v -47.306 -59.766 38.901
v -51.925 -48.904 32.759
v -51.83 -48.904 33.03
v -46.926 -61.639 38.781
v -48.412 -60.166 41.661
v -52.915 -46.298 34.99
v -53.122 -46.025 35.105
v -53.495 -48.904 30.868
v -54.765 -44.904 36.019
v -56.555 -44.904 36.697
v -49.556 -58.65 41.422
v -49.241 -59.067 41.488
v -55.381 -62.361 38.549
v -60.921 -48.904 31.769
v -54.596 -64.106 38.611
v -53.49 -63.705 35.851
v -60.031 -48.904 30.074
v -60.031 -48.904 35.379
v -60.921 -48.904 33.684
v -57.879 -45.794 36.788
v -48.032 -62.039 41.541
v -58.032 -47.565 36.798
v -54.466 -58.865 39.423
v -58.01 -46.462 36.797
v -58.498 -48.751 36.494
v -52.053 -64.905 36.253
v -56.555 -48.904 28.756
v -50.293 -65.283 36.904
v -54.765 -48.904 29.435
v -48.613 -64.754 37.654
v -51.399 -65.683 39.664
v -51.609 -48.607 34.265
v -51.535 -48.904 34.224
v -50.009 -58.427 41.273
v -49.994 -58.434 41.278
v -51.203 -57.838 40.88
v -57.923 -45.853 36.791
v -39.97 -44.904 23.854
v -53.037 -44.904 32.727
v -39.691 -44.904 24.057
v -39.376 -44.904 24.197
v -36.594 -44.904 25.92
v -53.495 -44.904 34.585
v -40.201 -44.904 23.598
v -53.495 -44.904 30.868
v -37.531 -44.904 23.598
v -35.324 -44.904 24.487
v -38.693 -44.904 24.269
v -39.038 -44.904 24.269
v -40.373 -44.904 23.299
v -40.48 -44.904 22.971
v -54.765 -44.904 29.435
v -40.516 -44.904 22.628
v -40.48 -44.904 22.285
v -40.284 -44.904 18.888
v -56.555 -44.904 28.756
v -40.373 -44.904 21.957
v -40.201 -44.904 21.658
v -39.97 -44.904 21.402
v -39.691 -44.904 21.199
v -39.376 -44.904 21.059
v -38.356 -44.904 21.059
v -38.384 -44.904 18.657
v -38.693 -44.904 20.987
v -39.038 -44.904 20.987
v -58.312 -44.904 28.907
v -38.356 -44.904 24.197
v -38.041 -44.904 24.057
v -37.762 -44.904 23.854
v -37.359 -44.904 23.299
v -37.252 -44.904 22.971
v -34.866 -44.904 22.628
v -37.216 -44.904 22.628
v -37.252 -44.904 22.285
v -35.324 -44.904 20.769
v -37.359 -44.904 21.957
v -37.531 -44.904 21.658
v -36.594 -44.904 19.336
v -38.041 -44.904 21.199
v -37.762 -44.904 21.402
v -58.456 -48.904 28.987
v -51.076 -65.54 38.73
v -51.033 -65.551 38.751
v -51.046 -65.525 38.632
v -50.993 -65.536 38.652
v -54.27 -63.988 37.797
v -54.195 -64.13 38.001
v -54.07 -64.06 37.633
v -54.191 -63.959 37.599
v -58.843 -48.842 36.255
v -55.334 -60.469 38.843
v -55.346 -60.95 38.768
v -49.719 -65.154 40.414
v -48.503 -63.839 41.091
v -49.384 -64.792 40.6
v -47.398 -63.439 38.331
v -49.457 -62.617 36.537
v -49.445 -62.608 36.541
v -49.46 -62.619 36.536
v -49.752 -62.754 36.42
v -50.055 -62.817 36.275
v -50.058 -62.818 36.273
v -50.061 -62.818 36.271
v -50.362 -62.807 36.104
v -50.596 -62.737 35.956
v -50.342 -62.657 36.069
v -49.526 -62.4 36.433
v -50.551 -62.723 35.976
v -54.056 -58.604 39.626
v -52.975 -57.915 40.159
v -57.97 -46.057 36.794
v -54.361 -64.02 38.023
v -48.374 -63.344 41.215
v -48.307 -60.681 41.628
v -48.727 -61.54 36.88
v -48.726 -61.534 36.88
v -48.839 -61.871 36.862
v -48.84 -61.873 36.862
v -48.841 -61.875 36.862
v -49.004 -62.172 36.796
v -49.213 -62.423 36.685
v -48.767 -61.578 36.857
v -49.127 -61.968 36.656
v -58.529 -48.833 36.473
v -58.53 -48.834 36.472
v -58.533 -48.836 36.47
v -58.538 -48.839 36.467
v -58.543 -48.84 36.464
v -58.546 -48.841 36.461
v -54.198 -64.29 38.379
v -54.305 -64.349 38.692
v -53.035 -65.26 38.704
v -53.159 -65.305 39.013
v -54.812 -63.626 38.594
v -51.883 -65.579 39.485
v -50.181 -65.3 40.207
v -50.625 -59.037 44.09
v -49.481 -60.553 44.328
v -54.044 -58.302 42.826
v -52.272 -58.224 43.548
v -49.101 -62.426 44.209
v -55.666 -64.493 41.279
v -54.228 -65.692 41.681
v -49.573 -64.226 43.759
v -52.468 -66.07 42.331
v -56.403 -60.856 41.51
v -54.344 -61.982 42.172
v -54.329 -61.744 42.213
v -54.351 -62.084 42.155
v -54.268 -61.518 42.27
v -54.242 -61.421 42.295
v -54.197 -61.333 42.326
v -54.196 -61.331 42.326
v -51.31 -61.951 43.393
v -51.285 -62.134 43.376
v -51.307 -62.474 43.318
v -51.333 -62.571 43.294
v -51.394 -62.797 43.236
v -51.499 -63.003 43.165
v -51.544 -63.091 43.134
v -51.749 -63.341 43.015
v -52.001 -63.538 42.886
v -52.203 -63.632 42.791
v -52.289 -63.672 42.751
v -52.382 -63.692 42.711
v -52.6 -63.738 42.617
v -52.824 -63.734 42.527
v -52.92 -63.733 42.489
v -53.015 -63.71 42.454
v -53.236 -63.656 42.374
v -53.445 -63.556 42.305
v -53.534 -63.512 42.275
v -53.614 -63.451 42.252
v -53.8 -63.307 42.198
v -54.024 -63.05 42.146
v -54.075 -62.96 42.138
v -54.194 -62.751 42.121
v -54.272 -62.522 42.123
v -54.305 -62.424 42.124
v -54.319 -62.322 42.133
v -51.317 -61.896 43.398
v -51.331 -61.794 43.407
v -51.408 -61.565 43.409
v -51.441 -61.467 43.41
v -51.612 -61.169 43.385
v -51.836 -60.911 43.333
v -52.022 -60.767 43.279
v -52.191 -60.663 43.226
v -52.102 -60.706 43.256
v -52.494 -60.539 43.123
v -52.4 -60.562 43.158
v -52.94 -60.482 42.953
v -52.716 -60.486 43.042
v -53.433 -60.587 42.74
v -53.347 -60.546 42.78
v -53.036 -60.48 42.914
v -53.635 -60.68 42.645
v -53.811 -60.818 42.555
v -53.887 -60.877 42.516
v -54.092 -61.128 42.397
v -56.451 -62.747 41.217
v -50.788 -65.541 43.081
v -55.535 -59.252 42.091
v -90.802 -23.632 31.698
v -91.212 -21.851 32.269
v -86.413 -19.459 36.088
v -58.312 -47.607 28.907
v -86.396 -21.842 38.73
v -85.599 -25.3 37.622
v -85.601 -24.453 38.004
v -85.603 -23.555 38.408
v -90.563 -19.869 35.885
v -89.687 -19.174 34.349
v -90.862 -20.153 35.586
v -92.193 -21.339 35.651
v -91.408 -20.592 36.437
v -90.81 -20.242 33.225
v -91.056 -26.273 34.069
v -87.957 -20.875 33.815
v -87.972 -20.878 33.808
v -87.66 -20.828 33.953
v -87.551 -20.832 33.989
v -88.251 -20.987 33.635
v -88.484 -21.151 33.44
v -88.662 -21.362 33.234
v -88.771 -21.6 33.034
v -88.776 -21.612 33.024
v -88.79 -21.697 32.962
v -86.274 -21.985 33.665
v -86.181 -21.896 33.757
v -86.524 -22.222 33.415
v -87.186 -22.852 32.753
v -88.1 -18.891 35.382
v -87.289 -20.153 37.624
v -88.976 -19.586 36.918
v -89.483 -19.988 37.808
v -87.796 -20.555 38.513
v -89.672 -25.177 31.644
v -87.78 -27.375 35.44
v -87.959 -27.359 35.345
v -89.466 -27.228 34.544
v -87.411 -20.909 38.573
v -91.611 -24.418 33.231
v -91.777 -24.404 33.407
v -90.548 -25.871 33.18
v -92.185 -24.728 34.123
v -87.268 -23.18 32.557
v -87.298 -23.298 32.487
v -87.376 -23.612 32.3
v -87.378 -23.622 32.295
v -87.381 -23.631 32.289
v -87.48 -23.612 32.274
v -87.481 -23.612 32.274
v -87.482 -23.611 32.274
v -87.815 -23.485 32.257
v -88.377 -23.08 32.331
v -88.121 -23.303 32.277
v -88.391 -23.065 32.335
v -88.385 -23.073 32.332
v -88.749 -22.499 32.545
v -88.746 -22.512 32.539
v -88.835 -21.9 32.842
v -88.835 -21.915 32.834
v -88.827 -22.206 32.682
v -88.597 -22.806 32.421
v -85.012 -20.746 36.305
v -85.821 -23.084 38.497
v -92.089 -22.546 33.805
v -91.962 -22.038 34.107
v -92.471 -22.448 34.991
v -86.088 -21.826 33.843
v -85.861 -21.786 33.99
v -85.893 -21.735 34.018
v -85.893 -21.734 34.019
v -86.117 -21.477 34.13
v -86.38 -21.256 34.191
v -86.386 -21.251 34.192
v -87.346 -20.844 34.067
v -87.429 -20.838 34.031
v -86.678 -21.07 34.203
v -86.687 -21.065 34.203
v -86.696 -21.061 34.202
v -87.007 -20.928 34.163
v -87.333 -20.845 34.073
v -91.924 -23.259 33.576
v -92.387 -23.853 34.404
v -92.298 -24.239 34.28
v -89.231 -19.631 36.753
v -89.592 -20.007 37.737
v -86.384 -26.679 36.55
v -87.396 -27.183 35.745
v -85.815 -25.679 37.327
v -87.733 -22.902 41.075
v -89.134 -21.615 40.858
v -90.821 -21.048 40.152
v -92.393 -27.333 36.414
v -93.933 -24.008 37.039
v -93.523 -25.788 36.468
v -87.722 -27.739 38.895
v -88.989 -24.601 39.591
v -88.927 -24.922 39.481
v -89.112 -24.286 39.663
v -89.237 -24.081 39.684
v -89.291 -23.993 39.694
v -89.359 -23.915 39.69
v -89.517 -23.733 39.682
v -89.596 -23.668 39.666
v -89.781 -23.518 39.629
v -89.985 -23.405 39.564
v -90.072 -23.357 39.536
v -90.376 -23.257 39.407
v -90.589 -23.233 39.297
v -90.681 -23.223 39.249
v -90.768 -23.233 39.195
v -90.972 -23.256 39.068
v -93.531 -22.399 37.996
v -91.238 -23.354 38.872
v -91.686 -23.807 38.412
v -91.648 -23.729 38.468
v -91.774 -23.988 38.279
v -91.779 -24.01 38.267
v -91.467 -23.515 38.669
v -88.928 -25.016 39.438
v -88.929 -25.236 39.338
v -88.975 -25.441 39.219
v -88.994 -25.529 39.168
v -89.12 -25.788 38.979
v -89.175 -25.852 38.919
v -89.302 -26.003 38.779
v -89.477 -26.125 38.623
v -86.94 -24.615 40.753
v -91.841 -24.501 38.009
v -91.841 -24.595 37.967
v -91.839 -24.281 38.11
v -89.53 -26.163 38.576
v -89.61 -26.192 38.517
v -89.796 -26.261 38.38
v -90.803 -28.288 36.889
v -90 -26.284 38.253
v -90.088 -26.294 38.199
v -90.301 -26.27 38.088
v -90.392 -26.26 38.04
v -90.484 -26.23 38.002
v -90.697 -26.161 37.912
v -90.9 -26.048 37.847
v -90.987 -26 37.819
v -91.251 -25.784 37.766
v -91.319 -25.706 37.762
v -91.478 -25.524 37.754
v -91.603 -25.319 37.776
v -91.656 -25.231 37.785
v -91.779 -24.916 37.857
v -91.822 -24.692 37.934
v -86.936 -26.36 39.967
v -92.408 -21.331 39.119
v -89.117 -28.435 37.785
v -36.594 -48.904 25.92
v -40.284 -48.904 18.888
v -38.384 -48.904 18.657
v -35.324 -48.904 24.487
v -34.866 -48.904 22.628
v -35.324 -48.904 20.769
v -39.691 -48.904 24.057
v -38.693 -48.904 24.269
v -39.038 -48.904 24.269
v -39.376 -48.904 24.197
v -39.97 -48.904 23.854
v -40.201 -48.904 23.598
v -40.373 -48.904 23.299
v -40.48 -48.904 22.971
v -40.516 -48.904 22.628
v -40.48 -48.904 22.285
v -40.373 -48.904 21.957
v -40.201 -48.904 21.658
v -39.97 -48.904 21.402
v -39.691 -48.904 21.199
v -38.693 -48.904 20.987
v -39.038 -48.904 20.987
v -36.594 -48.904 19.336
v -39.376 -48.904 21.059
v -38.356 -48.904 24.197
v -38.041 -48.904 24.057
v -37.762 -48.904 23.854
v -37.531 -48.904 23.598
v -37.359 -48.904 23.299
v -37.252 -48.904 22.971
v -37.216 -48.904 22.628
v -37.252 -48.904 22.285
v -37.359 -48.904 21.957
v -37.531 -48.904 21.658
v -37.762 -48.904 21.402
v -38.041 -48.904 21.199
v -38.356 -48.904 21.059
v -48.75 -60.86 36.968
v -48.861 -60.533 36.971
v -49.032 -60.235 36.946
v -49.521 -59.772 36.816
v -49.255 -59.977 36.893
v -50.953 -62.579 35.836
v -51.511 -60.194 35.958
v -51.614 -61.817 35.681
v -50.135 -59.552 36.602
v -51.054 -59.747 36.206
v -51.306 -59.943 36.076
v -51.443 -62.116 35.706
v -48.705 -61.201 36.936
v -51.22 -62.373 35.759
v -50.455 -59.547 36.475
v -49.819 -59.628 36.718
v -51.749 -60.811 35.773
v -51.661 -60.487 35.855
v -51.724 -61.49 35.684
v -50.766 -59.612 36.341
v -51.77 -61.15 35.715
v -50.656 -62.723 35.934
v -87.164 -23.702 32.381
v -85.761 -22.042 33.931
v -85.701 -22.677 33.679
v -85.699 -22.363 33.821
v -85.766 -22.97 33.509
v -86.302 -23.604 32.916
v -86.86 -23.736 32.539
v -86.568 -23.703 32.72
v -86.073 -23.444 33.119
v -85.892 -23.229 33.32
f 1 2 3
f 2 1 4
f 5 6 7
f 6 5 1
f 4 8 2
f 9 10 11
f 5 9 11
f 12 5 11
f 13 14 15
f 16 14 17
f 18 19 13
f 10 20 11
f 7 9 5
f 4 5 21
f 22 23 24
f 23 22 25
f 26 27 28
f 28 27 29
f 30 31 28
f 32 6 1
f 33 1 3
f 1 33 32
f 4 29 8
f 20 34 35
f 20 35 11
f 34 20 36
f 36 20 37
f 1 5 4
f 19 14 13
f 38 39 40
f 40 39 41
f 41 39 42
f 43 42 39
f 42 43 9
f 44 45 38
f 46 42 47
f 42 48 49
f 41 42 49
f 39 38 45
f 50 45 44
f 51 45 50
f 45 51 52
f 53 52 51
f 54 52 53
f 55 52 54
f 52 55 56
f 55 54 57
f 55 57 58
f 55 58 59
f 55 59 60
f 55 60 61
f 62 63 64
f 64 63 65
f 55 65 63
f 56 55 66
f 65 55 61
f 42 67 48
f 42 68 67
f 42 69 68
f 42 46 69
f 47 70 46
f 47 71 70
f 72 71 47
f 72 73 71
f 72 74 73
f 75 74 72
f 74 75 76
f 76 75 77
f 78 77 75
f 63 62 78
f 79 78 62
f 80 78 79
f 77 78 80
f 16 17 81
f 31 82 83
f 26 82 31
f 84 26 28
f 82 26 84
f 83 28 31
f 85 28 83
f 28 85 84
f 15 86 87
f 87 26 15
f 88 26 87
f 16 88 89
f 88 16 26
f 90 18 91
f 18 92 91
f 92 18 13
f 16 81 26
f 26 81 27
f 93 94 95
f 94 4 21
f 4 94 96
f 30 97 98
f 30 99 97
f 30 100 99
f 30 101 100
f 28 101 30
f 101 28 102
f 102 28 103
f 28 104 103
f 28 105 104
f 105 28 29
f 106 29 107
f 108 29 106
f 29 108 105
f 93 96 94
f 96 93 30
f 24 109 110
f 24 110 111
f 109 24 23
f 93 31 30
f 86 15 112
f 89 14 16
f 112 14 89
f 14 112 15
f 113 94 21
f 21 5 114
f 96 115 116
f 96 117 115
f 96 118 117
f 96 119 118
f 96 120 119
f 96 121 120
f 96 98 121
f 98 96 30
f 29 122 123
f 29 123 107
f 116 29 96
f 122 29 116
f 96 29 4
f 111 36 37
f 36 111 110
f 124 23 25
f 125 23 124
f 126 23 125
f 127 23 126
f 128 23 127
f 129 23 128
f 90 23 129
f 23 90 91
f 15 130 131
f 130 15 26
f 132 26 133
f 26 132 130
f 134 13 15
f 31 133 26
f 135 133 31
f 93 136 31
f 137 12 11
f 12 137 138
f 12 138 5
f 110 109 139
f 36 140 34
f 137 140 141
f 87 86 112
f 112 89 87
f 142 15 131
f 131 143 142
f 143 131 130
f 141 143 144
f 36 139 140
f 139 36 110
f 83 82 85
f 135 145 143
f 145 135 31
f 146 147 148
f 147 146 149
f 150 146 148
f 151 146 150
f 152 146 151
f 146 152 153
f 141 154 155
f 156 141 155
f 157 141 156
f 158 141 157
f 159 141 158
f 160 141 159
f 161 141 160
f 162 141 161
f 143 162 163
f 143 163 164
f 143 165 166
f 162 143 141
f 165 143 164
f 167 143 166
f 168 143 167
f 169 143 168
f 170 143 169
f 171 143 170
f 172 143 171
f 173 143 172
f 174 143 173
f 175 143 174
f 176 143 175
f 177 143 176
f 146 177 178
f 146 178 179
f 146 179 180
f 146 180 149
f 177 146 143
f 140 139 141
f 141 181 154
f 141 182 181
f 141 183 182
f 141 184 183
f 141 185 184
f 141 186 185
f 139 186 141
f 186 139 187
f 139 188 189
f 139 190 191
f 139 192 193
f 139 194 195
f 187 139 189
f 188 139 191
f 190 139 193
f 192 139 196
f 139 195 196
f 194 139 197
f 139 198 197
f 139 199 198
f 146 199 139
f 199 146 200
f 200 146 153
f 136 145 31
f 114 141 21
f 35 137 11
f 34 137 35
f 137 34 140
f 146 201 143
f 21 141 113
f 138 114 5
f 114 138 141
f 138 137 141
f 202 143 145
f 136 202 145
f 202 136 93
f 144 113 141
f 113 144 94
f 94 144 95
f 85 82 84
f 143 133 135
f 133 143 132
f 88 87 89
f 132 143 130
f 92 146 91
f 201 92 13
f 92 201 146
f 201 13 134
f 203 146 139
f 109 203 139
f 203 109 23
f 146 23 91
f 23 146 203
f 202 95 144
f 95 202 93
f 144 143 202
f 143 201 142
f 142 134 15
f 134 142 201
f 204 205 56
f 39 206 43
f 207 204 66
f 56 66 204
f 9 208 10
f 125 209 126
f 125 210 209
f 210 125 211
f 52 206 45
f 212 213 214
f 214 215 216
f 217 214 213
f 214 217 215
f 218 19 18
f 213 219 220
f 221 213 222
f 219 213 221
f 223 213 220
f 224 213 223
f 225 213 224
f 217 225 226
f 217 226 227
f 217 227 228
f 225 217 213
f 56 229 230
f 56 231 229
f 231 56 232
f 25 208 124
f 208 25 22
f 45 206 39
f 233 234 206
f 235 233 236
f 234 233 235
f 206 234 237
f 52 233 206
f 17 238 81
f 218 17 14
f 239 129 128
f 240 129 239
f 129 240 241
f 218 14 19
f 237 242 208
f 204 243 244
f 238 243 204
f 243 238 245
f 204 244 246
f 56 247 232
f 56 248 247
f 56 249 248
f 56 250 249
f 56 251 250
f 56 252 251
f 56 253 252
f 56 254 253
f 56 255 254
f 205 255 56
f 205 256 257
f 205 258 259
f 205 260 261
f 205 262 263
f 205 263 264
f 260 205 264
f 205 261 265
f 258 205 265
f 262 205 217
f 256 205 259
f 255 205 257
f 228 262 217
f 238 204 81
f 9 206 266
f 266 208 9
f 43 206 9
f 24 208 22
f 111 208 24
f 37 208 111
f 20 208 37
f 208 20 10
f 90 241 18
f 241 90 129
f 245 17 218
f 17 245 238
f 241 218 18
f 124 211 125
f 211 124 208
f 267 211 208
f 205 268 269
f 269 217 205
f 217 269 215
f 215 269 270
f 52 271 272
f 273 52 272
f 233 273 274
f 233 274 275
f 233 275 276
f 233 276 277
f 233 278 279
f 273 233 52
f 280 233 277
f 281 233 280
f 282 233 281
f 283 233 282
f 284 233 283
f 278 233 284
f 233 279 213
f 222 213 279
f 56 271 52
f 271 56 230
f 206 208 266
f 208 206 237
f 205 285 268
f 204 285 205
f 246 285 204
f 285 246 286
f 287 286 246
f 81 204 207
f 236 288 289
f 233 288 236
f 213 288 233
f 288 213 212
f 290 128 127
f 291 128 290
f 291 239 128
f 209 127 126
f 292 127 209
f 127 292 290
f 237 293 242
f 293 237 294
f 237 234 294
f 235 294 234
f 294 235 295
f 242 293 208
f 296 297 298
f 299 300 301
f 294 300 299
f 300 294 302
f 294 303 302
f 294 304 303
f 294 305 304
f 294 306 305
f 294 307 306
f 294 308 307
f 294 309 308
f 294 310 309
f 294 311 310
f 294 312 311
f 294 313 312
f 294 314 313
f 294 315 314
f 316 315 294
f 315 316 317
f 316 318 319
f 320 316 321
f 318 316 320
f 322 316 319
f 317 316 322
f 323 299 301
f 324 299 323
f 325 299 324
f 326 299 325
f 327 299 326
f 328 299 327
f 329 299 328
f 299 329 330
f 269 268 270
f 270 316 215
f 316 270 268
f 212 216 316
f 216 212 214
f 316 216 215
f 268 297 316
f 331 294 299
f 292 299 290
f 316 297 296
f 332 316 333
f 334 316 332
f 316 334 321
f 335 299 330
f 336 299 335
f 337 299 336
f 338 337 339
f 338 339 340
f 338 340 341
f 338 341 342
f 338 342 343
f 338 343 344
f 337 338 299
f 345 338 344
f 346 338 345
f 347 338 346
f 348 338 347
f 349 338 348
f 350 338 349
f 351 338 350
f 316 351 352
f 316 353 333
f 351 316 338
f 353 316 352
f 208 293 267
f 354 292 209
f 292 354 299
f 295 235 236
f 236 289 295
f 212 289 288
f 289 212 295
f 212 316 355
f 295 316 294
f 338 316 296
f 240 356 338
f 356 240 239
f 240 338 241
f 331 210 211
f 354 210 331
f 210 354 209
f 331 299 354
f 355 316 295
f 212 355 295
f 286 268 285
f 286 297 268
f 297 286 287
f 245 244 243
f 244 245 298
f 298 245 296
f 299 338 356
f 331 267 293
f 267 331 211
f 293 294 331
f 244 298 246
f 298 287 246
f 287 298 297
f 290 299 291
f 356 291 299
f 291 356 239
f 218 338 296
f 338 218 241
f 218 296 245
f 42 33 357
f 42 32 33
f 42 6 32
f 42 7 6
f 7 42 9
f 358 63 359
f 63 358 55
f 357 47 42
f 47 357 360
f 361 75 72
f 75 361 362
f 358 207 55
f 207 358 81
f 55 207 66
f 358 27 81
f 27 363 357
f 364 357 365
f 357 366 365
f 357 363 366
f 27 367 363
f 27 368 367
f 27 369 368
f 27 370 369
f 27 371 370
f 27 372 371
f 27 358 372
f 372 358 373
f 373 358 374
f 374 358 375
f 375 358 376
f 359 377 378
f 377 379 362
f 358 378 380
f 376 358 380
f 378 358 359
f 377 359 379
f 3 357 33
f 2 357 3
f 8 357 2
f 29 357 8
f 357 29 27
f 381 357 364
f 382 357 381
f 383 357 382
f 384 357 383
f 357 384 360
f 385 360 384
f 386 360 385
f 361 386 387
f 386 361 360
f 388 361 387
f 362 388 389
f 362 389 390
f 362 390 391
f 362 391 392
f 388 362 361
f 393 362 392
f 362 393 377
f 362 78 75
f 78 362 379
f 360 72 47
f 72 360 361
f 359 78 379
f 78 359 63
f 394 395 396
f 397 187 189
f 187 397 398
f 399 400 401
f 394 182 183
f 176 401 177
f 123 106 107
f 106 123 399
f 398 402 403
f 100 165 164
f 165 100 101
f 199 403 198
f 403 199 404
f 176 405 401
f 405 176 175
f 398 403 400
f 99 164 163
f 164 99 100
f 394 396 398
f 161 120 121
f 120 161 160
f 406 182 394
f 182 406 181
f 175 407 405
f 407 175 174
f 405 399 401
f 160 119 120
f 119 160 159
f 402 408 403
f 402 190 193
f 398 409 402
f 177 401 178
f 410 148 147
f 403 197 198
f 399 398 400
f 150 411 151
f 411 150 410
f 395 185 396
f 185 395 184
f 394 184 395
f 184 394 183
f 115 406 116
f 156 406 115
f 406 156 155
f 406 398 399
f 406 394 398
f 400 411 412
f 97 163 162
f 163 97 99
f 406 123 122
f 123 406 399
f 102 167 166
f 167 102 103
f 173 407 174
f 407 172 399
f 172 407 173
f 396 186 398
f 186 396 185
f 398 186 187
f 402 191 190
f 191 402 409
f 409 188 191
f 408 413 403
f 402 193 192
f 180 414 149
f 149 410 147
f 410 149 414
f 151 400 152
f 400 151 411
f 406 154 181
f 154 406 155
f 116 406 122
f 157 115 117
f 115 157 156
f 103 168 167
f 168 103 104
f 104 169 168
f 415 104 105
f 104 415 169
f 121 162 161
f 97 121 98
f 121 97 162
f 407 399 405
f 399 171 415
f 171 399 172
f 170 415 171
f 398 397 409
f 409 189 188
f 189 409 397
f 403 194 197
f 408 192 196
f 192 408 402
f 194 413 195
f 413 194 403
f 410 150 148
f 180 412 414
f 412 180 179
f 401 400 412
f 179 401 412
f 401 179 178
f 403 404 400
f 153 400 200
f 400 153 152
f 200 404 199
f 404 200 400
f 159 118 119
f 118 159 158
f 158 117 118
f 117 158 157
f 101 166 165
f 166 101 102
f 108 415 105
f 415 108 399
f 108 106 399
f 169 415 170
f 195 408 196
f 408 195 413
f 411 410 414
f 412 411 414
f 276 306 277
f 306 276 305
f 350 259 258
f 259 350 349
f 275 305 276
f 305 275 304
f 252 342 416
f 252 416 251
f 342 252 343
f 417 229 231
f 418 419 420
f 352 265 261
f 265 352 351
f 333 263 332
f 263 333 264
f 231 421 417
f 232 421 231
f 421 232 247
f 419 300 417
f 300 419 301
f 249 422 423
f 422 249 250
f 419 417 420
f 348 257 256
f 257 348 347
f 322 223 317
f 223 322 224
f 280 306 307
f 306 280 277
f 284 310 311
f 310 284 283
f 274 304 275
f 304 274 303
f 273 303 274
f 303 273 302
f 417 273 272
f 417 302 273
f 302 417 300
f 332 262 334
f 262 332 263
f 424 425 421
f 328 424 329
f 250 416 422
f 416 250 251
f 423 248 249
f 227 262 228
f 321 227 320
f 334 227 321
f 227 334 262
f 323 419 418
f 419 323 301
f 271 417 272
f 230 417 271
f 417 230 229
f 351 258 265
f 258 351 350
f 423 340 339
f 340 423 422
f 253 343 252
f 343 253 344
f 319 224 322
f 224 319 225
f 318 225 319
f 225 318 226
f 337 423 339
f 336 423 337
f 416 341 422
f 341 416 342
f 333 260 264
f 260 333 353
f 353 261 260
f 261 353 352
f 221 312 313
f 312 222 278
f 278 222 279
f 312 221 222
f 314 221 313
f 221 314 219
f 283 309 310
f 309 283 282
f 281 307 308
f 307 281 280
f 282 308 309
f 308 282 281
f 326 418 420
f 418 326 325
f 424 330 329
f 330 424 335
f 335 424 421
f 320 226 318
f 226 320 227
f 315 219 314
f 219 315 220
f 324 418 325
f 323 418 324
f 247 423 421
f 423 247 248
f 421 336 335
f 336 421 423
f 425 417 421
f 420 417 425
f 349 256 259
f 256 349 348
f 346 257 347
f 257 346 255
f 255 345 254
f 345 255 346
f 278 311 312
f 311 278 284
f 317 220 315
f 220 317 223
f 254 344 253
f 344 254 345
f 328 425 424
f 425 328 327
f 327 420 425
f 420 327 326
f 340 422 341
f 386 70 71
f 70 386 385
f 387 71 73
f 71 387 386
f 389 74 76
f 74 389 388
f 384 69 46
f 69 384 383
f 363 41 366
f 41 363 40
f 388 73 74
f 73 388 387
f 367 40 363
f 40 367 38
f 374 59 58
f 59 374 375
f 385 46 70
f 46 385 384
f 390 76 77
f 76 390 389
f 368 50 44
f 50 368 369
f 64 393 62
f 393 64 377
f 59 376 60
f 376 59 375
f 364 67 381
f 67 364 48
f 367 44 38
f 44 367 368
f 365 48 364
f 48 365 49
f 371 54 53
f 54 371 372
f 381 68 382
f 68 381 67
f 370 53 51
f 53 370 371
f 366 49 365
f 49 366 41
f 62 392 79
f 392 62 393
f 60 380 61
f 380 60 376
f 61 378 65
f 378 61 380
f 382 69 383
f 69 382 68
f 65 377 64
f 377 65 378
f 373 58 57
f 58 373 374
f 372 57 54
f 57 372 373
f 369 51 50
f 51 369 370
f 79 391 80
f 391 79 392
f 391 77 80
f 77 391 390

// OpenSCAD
difference () {
  union () {
    hull () {
      translate ([-57.037304979992584, -46.90390227202768, 32.72657997924274]) {
        rotate (a=90.0, v=[1, 0, 0]) {
          cylinder (h=4, r=4, center=true);
        }
      }
      translate ([-22, -36, -3]) {
        translate ([-36.42059678255161, -13.748592644796744, 45.42143047760381]) {
          rotate (a=25.0, v=[0, 0, 1]) {
            rotate (a=-23.000000000000004, v=[0, 1, 0]) {
              rotate (a=-1.9999999999999998, v=[1, 0, 0]) {
                translate ([0, 0, -4.5]) {
                  translate ([0, -13.575, 0]) {
                    cylinder (h=3, r=4, center=true);
                  }
                }
              }
            }
          }
        }
      }
    }
    translate ([-22, -36, -3]) {
      translate ([-36.42059678255161, -13.748592644796744, 45.42143047760381]) {
        rotate (a=25.0, v=[0, 0, 1]) {
          rotate (a=-23.000000000000004, v=[0, 1, 0]) {
            rotate (a=-1.9999999999999998, v=[1, 0, 0]) {
              translate ([0, 0, -2.0999999999999996]) {
                translate ([0, -13.575, 0]) {
                  cylinder (h=4, r=4, center=true);
                }
              }
            }
          }
        }
      }
    }
    hull () {
      translate ([-57.037304979992584, -46.90390227202768, 32.72657997924274]) {
        rotate (a=90.0, v=[1, 0, 0]) {
          cylinder (h=4, r=4, center=true);
        }
      }
      translate ([-46, -22, -7]) {
        translate ([-36.42059678255161, -13.748592644796744, 45.42143047760381]) {
          rotate (a=34.99999999999999, v=[0, 0, 1]) {
            rotate (a=-36.0, v=[0, 1, 0]) {
              rotate (a=1.9999999999999998, v=[1, 0, 0]) {
                translate ([0, 0, -4.5]) {
                  translate ([0, 13.575, 0]) {
                    cylinder (h=3, r=4, center=true);
                  }
                }
              }
            }
          }
        }
      }
    }
    translate ([-46, -22, -7]) {
      translate ([-36.42059678255161, -13.748592644796744, 45.42143047760381]) {
        rotate (a=34.99999999999999, v=[0, 0, 1]) {
          rotate (a=-36.0, v=[0, 1, 0]) {
            rotate (a=1.9999999999999998, v=[1, 0, 0]) {
              translate ([0, 0, -2.0999999999999996]) {
                translate ([0, 13.575, 0]) {
                  cylinder (h=4, r=4, center=true);
                }
              }
            }
          }
        }
      }
    }
    hull () {
      translate ([-57.037304979992584, -46.90390227202768, 32.72657997924274]) {
        rotate (a=90.0, v=[1, 0, 0]) {
          cylinder (h=4, r=4, center=true);
        }
      }
      translate ([0, 4, 0]) {
        translate ([-38.86596295863632, -50.90390227202768, 22.628112637472807]) {
          rotate (a=90.0, v=[1, 0, 0]) {
            cylinder (h=4, r=4, center=true);
          }
        }
      }
    }
  }
  union () {
    translate ([-22, -36, -3]) {
      translate ([-36.42059678255161, -13.748592644796744, 45.42143047760381]) {
        rotate (a=25.0, v=[0, 0, 1]) {
          rotate (a=-23.000000000000004, v=[0, 1, 0]) {
            rotate (a=-1.9999999999999998, v=[1, 0, 0]) {
              translate ([0, 0, -2.0999999999999996]) {
                translate ([0, -13.575, 0]) {
                  cylinder ($fn=30, h=10, r=1.65, center=true);
                }
              }
            }
          }
        }
      }
    }
    translate ([-46, -22, -7]) {
      translate ([-36.42059678255161, -13.748592644796744, 45.42143047760381]) {
        rotate (a=34.99999999999999, v=[0, 0, 1]) {
          rotate (a=-36.0, v=[0, 1, 0]) {
            rotate (a=1.9999999999999998, v=[1, 0, 0]) {
              translate ([0, 0, -2.0999999999999996]) {
                translate ([0, 13.575, 0]) {
                  cylinder ($fn=30, h=10, r=1.65, center=true);
                }
              }
            }
          }
        }
      }
    }
    translate ([-38.86596295863632, -50.90390227202768, 22.628112637472807]) {
      rotate (a=90.0, v=[1, 0, 0]) {
        cylinder ($fn=30, h=20, r=1.65, center=true);
      }
    }
  }
}
